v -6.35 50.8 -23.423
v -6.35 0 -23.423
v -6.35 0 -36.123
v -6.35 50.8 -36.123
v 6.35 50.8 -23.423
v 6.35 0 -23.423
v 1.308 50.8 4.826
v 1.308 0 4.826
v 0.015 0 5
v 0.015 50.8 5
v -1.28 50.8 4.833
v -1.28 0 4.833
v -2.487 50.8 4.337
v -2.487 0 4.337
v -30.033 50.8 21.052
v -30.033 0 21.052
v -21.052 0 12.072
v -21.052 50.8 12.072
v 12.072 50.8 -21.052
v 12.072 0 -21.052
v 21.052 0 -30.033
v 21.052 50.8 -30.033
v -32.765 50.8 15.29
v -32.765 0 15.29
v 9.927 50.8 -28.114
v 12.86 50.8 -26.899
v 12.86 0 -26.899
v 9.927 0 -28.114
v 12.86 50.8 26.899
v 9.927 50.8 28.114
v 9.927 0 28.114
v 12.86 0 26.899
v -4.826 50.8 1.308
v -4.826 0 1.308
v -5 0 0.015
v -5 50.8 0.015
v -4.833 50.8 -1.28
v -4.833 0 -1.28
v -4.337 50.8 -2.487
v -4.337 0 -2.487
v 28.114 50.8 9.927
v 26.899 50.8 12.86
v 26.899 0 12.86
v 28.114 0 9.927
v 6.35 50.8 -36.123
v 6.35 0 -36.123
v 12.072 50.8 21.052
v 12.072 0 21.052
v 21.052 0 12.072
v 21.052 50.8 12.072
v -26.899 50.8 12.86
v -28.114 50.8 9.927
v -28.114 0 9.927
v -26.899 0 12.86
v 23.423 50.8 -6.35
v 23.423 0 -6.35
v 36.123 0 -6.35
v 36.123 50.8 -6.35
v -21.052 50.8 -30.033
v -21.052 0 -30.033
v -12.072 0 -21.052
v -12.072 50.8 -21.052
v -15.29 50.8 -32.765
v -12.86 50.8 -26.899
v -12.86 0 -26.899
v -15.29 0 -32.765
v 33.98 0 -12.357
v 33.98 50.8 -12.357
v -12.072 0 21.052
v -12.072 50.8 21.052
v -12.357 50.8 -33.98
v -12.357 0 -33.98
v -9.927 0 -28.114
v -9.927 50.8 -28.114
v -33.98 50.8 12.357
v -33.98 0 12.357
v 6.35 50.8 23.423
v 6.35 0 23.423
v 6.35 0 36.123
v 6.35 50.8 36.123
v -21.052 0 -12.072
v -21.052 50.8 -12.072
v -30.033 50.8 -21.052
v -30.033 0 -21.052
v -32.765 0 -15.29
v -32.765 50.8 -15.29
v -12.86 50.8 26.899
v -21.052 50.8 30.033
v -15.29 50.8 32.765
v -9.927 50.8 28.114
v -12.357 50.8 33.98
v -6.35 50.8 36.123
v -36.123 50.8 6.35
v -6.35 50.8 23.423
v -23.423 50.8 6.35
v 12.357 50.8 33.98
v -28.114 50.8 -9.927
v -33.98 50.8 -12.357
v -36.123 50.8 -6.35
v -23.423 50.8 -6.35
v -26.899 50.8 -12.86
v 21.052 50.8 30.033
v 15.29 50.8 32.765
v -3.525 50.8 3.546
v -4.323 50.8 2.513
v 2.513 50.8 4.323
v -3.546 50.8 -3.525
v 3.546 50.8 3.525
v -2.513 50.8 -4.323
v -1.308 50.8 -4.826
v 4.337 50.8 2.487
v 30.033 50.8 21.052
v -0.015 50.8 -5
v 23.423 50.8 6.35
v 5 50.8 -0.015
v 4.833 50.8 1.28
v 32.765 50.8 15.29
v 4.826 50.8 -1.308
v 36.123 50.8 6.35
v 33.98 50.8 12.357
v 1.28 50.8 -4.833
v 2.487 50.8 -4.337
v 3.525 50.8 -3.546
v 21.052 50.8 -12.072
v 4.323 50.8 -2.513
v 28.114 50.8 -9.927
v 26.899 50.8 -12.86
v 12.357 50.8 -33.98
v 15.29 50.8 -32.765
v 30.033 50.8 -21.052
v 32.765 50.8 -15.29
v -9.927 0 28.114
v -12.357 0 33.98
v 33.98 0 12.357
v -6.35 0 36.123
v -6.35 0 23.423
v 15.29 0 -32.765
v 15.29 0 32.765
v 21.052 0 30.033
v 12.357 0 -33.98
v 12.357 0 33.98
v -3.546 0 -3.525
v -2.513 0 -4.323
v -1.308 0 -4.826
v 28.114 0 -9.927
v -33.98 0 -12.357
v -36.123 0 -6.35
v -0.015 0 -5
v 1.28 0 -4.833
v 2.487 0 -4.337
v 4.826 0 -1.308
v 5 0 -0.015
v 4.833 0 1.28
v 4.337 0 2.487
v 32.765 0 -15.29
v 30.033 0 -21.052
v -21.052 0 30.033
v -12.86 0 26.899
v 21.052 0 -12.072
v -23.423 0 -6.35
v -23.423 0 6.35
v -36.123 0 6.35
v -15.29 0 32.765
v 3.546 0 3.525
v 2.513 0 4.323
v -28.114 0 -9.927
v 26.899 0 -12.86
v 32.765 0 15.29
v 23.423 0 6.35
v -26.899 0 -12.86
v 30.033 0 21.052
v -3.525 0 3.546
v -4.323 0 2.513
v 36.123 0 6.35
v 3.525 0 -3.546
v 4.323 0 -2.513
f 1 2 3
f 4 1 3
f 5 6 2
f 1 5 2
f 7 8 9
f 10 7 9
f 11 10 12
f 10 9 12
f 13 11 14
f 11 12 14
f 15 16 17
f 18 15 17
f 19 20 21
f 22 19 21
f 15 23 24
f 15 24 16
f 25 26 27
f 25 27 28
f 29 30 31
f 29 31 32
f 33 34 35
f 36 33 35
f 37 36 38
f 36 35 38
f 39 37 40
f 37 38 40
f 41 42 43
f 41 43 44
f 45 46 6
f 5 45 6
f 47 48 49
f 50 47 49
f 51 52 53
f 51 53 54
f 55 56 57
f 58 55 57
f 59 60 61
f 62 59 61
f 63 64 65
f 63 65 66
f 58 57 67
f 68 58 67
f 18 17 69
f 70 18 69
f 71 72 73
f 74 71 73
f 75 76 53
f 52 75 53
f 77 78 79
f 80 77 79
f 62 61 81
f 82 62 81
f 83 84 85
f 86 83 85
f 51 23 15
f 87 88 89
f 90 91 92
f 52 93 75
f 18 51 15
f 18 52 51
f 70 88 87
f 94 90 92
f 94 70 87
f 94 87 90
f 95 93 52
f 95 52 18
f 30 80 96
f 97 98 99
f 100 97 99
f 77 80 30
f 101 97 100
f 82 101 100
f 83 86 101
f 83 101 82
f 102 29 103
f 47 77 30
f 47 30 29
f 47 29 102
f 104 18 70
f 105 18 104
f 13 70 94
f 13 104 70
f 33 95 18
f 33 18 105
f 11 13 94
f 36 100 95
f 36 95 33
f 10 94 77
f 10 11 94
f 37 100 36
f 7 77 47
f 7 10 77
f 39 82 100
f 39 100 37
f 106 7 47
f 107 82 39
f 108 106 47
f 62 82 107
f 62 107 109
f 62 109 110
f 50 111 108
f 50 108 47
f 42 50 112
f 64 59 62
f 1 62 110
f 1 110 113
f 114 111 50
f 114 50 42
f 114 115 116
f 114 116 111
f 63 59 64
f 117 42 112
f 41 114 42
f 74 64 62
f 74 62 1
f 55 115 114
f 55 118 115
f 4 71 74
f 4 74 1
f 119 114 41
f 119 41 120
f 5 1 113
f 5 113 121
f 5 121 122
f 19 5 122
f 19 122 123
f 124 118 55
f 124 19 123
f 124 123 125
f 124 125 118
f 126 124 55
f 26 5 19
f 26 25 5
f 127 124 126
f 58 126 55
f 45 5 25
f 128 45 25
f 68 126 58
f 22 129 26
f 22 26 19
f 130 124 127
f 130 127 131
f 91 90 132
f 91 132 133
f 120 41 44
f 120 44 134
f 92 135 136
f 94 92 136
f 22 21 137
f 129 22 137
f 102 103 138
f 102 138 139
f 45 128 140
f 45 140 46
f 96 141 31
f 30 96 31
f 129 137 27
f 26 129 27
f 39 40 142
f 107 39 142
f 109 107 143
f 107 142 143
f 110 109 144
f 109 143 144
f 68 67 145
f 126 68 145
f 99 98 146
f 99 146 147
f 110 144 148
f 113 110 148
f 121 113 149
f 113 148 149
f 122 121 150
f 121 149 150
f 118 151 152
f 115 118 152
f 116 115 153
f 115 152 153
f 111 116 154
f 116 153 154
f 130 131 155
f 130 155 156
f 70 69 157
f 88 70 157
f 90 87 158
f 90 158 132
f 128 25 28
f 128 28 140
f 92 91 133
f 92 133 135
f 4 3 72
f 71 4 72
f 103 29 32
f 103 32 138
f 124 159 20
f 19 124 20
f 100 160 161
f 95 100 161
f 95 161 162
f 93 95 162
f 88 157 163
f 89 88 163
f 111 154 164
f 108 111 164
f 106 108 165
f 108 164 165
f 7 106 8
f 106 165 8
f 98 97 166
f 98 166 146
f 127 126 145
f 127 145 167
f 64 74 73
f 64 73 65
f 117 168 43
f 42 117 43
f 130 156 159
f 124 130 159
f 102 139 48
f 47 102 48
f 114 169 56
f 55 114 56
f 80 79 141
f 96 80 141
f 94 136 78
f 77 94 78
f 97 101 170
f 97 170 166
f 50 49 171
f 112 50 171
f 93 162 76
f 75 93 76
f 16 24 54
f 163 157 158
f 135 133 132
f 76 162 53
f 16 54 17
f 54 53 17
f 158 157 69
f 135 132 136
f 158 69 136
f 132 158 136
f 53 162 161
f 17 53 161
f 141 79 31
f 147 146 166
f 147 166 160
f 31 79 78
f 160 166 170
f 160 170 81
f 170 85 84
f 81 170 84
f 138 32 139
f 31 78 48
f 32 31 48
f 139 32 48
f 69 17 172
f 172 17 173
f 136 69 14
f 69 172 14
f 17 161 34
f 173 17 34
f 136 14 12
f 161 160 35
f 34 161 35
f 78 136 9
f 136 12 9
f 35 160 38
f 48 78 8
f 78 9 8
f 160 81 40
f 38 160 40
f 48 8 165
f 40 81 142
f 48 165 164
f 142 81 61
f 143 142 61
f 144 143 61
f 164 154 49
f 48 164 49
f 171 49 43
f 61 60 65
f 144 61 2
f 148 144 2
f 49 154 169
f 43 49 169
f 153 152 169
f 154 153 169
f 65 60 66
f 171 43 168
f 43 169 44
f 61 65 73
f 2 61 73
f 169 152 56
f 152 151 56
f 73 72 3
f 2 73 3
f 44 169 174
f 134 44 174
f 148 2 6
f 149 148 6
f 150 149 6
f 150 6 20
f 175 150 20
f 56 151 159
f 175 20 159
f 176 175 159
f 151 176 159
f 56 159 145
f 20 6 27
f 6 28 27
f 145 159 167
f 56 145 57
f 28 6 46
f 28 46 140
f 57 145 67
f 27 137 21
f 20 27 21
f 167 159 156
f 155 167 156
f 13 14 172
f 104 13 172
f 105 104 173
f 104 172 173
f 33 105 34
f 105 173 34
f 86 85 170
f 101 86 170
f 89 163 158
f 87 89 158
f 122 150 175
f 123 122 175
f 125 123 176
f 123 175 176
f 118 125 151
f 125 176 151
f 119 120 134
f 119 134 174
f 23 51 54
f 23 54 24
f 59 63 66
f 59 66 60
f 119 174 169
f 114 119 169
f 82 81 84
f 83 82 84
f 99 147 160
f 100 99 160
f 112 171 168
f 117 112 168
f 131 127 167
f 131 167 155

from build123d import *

# Parameters (mm, degrees)
BOSS_EXTRUDE3_DEPTH = 50.8
CIRPATTERN2_COUNT   = 8


with BuildPart() as part:
    # Sketch1 → Boss-Extrude3 (new body)
    with BuildSketch(Plane(origin=(0, 0, 0), x_dir=(1, 0, 0), z_dir=(0, 1, 0))):
        with BuildLine():
            Line((21.052414425, 12.072158304), (12.072158304, 21.052414425))
            Line((12.072158304, 21.052414425), (2.487247326, 4.337464782))
            ThreePointArc((2.487247326, 4.337464782), (3.957792808, 3.055466591), (4.825800212, 1.30830131))
            Line((4.825800212, 1.30830131), (23.42261, 6.35))
            Line((23.42261, 6.35), (36.12261, 6.35))
            Line((36.12261, 6.35), (33.980449989, 12.356865623))
            Line((33.980449989, 12.356865623), (28.113814957, 9.926825827))
            Line((28.113814957, 9.926825827), (26.89879506, 12.860143343))
            Line((26.89879506, 12.860143343), (32.765430091, 15.290183139))
            Line((32.765430091, 15.290183139), (30.032670546, 21.052414425))
            Line((30.032670546, 21.052414425), (21.052414425, 12.072158304))
        make_face()
    extrude(amount=BOSS_EXTRUDE3_DEPTH)


with BuildPart() as cirpattern2_1:
    # CirPattern2: pattern copy
    add(part.part.rotate(Axis((0, -0.25, 0), (0, 1, 0)), 1 * 360 / CIRPATTERN2_COUNT))


with BuildPart() as cirpattern2_2:
    # CirPattern2: pattern copy
    add(part.part.rotate(Axis((0, -0.25, 0), (0, 1, 0)), 2 * 360 / CIRPATTERN2_COUNT))


with BuildPart() as cirpattern2_3:
    # CirPattern2: pattern copy
    add(part.part.rotate(Axis((0, -0.25, 0), (0, 1, 0)), 3 * 360 / CIRPATTERN2_COUNT))


with BuildPart() as cirpattern2_4:
    # CirPattern2: pattern copy
    add(part.part.rotate(Axis((0, -0.25, 0), (0, 1, 0)), 4 * 360 / CIRPATTERN2_COUNT))


with BuildPart() as cirpattern2_5:
    # CirPattern2: pattern copy
    add(part.part.rotate(Axis((0, -0.25, 0), (0, 1, 0)), 5 * 360 / CIRPATTERN2_COUNT))


with BuildPart() as cirpattern2_6:
    # CirPattern2: pattern copy
    add(part.part.rotate(Axis((0, -0.25, 0), (0, 1, 0)), 6 * 360 / CIRPATTERN2_COUNT))


with BuildPart() as cirpattern2_7:
    # CirPattern2: pattern copy
    add(part.part.rotate(Axis((0, -0.25, 0), (0, 1, 0)), 7 * 360 / CIRPATTERN2_COUNT))


with BuildPart() as cirpattern2_1_1:
    add(cirpattern2_1.part)

    # Combine2: union CirPattern2_2, CirPattern2_3, CirPattern2_4, CirPattern2_5, CirPattern2_6, CirPattern2_7, part
    add(cirpattern2_2.part)
    add(cirpattern2_3.part)
    add(cirpattern2_4.part)
    add(cirpattern2_5.part)
    add(cirpattern2_6.part)
    add(cirpattern2_7.part)
    add(part.part)


solid = cirpattern2_1_1.part
